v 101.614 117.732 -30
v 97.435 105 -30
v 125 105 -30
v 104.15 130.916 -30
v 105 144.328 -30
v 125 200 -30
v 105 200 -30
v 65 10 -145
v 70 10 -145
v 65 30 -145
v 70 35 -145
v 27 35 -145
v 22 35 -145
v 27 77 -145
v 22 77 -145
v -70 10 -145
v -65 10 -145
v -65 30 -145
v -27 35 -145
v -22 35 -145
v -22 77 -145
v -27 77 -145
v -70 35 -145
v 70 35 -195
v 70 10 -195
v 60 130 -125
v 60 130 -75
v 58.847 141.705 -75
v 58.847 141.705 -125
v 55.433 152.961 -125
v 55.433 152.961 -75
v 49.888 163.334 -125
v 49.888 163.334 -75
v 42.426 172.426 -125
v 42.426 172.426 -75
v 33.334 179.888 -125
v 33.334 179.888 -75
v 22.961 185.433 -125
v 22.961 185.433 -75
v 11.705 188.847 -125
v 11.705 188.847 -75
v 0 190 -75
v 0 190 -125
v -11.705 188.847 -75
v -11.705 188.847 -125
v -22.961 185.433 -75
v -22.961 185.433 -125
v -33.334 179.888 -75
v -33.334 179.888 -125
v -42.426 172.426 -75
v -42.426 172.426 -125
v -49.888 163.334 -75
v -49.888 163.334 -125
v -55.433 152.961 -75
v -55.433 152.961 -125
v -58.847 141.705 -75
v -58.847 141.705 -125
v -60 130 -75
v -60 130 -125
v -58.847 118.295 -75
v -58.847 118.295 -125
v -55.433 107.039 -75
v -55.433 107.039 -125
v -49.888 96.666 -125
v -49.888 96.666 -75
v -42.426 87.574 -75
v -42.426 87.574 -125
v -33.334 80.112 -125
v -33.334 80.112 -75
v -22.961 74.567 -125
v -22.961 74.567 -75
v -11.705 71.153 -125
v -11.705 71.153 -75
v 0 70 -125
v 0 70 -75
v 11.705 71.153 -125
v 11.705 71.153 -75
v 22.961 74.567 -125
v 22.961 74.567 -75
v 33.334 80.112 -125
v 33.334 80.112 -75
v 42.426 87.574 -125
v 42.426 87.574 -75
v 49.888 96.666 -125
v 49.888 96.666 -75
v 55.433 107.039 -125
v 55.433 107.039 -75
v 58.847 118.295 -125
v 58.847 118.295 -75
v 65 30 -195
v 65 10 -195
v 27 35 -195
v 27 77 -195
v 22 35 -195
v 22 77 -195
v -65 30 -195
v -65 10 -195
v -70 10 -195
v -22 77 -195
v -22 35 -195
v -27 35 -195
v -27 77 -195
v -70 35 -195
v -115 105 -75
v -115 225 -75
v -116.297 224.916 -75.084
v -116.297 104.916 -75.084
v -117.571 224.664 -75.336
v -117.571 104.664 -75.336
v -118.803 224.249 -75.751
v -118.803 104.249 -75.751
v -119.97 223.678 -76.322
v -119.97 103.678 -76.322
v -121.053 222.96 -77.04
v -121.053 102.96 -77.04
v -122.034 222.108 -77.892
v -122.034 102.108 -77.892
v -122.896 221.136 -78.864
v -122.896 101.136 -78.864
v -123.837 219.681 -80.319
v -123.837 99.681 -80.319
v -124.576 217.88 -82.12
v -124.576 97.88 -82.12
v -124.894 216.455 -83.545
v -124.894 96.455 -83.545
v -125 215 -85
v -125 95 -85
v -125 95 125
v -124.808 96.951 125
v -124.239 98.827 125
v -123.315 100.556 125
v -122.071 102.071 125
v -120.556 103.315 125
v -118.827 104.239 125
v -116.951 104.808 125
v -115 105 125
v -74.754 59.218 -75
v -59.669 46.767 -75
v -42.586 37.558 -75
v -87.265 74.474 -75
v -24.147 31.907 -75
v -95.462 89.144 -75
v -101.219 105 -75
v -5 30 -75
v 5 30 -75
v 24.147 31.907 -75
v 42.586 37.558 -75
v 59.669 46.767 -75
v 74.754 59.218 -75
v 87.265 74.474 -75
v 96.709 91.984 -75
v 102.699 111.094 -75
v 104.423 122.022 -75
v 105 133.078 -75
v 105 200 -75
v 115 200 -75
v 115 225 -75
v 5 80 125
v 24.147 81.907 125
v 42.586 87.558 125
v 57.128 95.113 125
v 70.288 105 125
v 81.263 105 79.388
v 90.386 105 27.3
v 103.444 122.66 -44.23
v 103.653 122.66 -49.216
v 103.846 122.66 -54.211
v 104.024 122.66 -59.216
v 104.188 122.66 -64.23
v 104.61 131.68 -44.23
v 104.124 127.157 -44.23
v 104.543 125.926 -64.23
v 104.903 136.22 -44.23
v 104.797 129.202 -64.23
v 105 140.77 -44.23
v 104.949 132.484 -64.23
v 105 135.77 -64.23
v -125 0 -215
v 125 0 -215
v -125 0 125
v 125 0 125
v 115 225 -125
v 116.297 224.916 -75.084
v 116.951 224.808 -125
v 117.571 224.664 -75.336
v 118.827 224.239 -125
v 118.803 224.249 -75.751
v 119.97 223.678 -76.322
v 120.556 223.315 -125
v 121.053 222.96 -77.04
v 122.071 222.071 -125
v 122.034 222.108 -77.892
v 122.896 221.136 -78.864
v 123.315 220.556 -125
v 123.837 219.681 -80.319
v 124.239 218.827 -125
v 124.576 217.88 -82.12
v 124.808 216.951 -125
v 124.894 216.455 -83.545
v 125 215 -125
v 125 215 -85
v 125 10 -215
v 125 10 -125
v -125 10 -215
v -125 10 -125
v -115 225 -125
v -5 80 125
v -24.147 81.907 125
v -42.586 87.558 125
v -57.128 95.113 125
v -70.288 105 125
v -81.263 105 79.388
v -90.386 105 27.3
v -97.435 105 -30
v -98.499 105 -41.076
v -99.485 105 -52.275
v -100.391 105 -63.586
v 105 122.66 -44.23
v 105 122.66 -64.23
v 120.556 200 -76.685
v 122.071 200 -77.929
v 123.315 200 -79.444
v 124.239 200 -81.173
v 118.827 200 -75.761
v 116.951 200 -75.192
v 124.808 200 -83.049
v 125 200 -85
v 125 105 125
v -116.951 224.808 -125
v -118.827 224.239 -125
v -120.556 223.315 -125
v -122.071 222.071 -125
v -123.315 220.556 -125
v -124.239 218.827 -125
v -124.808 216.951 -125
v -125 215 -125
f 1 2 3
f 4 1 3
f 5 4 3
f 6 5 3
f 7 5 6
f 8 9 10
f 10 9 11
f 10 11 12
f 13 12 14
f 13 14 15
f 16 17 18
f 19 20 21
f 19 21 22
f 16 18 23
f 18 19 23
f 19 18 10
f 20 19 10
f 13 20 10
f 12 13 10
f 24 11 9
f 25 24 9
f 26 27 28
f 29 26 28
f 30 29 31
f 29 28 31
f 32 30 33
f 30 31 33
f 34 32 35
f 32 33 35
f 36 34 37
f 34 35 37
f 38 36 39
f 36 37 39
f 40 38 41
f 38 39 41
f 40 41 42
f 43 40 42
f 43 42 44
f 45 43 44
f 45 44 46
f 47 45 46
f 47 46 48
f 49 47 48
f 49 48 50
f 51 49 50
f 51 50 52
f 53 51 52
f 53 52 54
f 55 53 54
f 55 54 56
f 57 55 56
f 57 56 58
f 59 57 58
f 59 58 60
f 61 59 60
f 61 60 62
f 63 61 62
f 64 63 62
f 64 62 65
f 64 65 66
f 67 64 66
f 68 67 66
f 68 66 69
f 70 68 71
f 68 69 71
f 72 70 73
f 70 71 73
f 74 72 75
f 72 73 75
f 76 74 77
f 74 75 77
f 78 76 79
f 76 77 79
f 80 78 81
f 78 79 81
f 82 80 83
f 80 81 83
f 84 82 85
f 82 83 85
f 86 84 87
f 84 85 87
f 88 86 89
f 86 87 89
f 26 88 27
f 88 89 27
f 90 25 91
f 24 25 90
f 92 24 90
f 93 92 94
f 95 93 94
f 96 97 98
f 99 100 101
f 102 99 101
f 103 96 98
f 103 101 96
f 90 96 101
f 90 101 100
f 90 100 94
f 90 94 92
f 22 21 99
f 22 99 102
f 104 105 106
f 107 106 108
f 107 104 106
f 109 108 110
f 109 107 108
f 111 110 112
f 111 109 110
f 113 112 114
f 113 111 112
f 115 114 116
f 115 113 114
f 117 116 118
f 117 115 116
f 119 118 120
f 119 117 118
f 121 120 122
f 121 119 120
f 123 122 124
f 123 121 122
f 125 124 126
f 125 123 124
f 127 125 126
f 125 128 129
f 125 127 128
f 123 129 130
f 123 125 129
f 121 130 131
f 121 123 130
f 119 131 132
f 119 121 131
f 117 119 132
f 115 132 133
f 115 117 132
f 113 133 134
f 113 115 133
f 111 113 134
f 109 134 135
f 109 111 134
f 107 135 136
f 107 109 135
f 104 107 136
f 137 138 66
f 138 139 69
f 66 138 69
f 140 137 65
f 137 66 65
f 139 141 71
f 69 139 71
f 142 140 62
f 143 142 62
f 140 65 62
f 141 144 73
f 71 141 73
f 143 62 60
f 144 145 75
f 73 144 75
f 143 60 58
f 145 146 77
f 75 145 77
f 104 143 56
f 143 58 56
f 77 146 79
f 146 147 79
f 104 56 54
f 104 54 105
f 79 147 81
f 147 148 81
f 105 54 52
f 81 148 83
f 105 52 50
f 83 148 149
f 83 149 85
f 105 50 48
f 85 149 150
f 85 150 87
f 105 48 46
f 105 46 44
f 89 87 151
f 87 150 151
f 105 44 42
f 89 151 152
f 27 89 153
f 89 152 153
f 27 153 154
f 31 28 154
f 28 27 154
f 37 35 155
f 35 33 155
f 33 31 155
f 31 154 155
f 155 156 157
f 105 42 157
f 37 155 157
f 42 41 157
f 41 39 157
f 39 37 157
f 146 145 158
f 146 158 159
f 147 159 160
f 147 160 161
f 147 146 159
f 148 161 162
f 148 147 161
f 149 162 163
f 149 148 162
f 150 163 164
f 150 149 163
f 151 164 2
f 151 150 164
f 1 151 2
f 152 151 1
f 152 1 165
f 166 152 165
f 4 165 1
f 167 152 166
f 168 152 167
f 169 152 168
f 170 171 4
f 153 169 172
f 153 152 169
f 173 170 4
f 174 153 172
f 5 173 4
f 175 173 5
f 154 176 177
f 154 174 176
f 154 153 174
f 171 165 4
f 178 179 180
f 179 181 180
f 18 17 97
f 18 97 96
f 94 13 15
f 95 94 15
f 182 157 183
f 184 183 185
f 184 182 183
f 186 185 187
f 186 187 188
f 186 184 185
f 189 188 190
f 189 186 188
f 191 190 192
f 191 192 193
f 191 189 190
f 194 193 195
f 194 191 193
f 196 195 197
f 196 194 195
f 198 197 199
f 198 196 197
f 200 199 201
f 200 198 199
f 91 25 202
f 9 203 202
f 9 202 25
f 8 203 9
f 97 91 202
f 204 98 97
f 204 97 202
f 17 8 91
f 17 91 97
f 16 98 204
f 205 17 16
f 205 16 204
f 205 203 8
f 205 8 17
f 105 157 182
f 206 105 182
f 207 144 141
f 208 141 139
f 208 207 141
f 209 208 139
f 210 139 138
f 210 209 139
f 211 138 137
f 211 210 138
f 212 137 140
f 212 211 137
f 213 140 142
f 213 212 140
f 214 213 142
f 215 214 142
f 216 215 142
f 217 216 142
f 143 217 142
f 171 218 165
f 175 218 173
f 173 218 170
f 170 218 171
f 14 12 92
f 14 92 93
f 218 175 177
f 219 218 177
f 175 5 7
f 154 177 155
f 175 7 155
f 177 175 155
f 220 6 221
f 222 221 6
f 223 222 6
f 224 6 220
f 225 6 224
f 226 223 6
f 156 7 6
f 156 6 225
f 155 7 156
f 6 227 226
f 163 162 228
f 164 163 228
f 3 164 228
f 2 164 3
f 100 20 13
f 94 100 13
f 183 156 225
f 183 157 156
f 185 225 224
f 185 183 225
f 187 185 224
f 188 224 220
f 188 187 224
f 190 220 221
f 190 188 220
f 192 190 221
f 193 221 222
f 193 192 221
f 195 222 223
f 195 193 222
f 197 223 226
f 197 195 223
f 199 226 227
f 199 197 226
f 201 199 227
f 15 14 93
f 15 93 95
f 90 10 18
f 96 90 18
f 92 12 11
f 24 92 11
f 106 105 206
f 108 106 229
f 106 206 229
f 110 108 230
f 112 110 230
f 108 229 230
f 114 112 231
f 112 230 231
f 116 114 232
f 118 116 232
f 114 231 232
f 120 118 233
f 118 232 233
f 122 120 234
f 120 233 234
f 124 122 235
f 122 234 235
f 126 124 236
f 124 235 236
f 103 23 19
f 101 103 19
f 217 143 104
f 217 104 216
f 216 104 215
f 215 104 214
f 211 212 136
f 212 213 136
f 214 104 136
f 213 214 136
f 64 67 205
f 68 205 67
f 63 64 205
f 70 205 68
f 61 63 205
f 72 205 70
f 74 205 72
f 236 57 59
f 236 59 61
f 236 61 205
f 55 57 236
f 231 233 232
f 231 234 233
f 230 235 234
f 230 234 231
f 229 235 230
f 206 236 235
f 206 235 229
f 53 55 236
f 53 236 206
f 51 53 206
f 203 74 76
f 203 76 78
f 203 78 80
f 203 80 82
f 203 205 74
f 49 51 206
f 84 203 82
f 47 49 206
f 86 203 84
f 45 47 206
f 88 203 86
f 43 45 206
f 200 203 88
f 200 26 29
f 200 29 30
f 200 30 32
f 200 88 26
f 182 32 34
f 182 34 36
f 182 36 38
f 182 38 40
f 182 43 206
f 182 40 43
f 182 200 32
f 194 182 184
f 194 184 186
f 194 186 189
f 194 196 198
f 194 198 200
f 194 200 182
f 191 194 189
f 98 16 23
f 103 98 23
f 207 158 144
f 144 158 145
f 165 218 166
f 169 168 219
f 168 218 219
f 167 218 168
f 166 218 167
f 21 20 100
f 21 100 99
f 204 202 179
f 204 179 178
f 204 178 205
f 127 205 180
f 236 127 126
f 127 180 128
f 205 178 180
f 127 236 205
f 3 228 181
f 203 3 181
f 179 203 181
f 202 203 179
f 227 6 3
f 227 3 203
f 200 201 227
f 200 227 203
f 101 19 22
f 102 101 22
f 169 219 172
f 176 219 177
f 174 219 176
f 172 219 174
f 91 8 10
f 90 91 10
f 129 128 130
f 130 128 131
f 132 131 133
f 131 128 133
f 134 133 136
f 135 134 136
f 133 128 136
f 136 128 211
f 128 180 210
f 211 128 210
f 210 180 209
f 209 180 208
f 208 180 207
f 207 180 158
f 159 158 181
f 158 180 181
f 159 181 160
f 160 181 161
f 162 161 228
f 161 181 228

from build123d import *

# Parameters (mm, degrees)
SKETCH2_W                = 250
SKETCH2_H                = 250
BOSS_EXTRUDE1_DEPTH      = 250
SKETCH3_W                = 210
SKETCH3_H                = 200
CUT_EXTRUDE1_DEPTH       = 220
BOSS_EXTRUDE2_REACH      = 363.974
FILLET1_R                = 100
FILLET2_R                = 20
SKETCH11_R               = 60
CUT_EXTRUDE2_DEPTH       = 344.693177122
SKETCH12_W               = 250
SKETCH12_H               = 10
BOSS_EXTRUDE3_DEPTH      = 90
BOSS_EXTRUDE4_START      = 20
SKETCH13_W               = 5
SKETCH13_H               = 20
BOSS_EXTRUDE4_DEPTH      = 50
BOSS_EXTRUDE5_START      = 20
SKETCH14_W               = 5
SKETCH14_H               = 42
BOSS_EXTRUDE5_DEPTH      = 50
SKETCH15_W               = 20
SKETCH15_H               = 40
CUT_EXTRUDE3_DEPTH       = 20
SKETCH17_W               = 20
SKETCH17_H               = 40
CUT_EXTRUDE5_DEPTH       = 23
SKETCH18_W               = 20
SKETCH18_H               = 10
BOSS_EXTRUDE6_DEPTH      = 20
SKETCH19_W               = 250
SKETCH19_H               = 50
CUT_EXTRUDE11_DEPTH      = 70
SKETCH24_W               = 200
SKETCH24_H               = 95
CUT_EXTRUDE12_DEPTH      = 70
CUT_EXTRUDE14_DEPTH      = 414.793426724
SKETCH26_W               = 75
SKETCH26_H               = 50
CUT_EXTRUDE15_DEPTH      = 344.693177122
BOSS_EXTRUDE7_REACH      = 415.793
SKETCH27_W               = 50
SKETCH27_H               = 25
CUT_EXTRUDE16_DEPTH      = 374.296129099
CUT_EXTRUDE16_DEPTH_BACK = 374.296129099
SKETCH28_W               = 50
SKETCH28_H               = 25
FILLET3_R                = 10
SKETCH29_W               = 20
SKETCH29_H               = 39.615
BOSS_EXTRUDE8_DEPTH      = 95


with BuildPart() as part:
    # Sketch2 → Boss-Extrude1 (new body)
    with BuildSketch(Plane(origin=(0, 0, 0), x_dir=(1, 0, 0), z_dir=(0, 1, 0))):
        Rectangle(SKETCH2_W, SKETCH2_H)
    extrude(amount=BOSS_EXTRUDE1_DEPTH)

    # Sketch3 → Cut-Extrude1 (cut)
    with BuildSketch(Plane(origin=(0, 250, 0), x_dir=(1, 0, 0), z_dir=(0, 1, 0))):
        with Locations((0, -25)):
            Rectangle(SKETCH3_W, SKETCH3_H)
    extrude(amount=-CUT_EXTRUDE1_DEPTH, mode=Mode.SUBTRACT)

    # Sketch5 → Boss-Extrude2 (add, up to next)
    with BuildSketch(Plane.ZY.offset(-105), mode=Mode.PRIVATE) as boss_extrude2_sk1:
        Polygon((125, 30), (125, 80), (-75, 30), align=None)
    boss_extrude2_tool1 = extrude(boss_extrude2_sk1.sketch, amount=BOSS_EXTRUDE2_REACH, mode=Mode.PRIVATE) - part.part
    add(boss_extrude2_tool1.solids().sort_by_distance((105, 46.666667, 58.333333))[0])

    # Fillet1
    fillet1_edges = [part.edges().sort_by_distance(p)[0] for p in [
        (-105, 55, 25),
        (105, 55, 25),
    ]]
    fillet(fillet1_edges, radius=FILLET1_R)

    # Fillet2
    fillet2_edges = [part.edges().sort_by_distance(p)[0] for p in [
        (115, 250, 125),
        (-115, 250, 125),
        (105, 250, 25),
        (0, 250, -75),
        (-105, 250, 25),
    ]]
    fillet(fillet2_edges, radius=FILLET2_R - 0.0001)  # a hair under: the kernel refuses the full size

    # Sketch11 → Cut-Extrude2 (cut, through all)
    with BuildSketch(Plane.XY.offset(-75)):
        with Locations((0, 130)):
            Circle(SKETCH11_R)
    extrude(amount=-CUT_EXTRUDE2_DEPTH, mode=Mode.SUBTRACT)

    # Sketch12 → Boss-Extrude3 (add)
    with BuildSketch(Plane(origin=(0, 0, -125), x_dir=(-1, 0, 0), z_dir=(0, 0, -1))):
        with Locations((0, 5)):
            Rectangle(SKETCH12_W, SKETCH12_H)
    extrude(amount=BOSS_EXTRUDE3_DEPTH)

    # Sketch13 → Boss-Extrude4 (add)
    with BuildSketch(Plane(origin=(0, 0, -125), x_dir=(-1, 0, 0), z_dir=(0, 0, -1)).offset(BOSS_EXTRUDE4_START)):
        Polygon((-70, 35), (-70, 30), (-65, 30), (0, 30), (0, 35), align=None)
        Polygon((0, 35), (0, 30), (65, 30), (70, 30), (70, 35), align=None)
        with Locations((67.5, 20)):
            Rectangle(SKETCH13_W, SKETCH13_H)
        with Locations((-67.5, 20)):
            Rectangle(SKETCH13_W, SKETCH13_H)
    extrude(amount=BOSS_EXTRUDE4_DEPTH)

    # Sketch14 → Boss-Extrude5 (add)
    with BuildSketch(Plane(origin=(0, 0, -125), x_dir=(-1, 0, 0), z_dir=(0, 0, -1)).offset(BOSS_EXTRUDE5_START)):
        with Locations((24.5, 56)):
            Rectangle(SKETCH14_W, SKETCH14_H)
        with Locations((-24.5, 56)):
            Rectangle(SKETCH14_W, SKETCH14_H)
    extrude(amount=BOSS_EXTRUDE5_DEPTH)

    # Sketch15 → Cut-Extrude3 (cut)
    with BuildSketch(Plane(origin=(125, 0, 0), x_dir=(0, 0, -1), z_dir=(1, 0, 0))):
        with Locations((54.23, 147.66)):
            Rectangle(SKETCH15_W, SKETCH15_H)
    extrude(amount=-CUT_EXTRUDE3_DEPTH, mode=Mode.SUBTRACT)

    # Sketch17 → Cut-Extrude5 (cut)
    with BuildSketch(Plane(origin=(125, 0, 0), x_dir=(0, 0, -1), z_dir=(1, 0, 0))):
        with Locations((54.23, 142.66)):
            Rectangle(SKETCH17_W, SKETCH17_H)
    extrude(amount=-CUT_EXTRUDE5_DEPTH, mode=Mode.SUBTRACT)

    # Sketch18 → Boss-Extrude6 (add)
    with BuildSketch(Plane(origin=(125, 0, 0), x_dir=(0, 0, -1), z_dir=(1, 0, 0))):
        with Locations((54.23, 162.66)):
            Rectangle(SKETCH18_W, SKETCH18_H)
    extrude(amount=-BOSS_EXTRUDE6_DEPTH)

    # Sketch19 → Cut-Extrude11 (cut)
    with BuildSketch(Plane.ZY.offset(125)):
        with Locations((0, 225)):
            Rectangle(SKETCH19_W, SKETCH19_H)
    extrude(amount=-CUT_EXTRUDE11_DEPTH, mode=Mode.SUBTRACT)

    # Sketch24 → Cut-Extrude12 (cut)
    with BuildSketch(Plane.ZY.offset(125)):
        with Locations((25, 152.5)):
            Rectangle(SKETCH24_W, SKETCH24_H)
    extrude(amount=-CUT_EXTRUDE12_DEPTH, mode=Mode.SUBTRACT)

    # Sketch25 → Cut-Extrude14 (cut, through all)
    with BuildSketch(Plane.ZY.offset(125)):
        Polygon((125, 105), (-30, 105), (-30, 200), (-75, 200), (-75, 250), (125, 250), align=None)
    extrude(amount=-CUT_EXTRUDE14_DEPTH, mode=Mode.SUBTRACT)

    # Sketch26 → Cut-Extrude15 (cut, through all)
    with BuildSketch(Plane.XY.offset(-75)):
        with Locations((87.5, 225)):
            Rectangle(SKETCH26_W, SKETCH26_H)
    extrude(amount=-CUT_EXTRUDE15_DEPTH, mode=Mode.SUBTRACT)

    # Boss-Extrude7: up to this face of the body (flat: up to its plane)
    boss_extrude7_end = Plane(part.part.faces().sort_by_distance((-125, 66.05015674, -19.686520376))[0])
    # Sketch27 → Boss-Extrude7 (add, up to the picked face)
    with BuildSketch(Plane(origin=(125, 0, 0), x_dir=(0, 0, -1), z_dir=(1, 0, 0)), mode=Mode.PRIVATE) as boss_extrude7_sk1:
        with Locations((100, 212.5)):
            Rectangle(SKETCH27_W, SKETCH27_H)
    boss_extrude7_tool1 = split(extrude(boss_extrude7_sk1.sketch, amount=-BOSS_EXTRUDE7_REACH, mode=Mode.PRIVATE), bisect_by=boss_extrude7_end, keep=Keep.BOTH, mode=Mode.PRIVATE)
    add(boss_extrude7_tool1.solids().sort_by(Axis((125, 212.5, -100), (-1, 0, 0)))[0])

    # Sketch28 → Cut-Extrude16 (cut, two sides: drawn at the far end of the back side and taken through both)
    with BuildSketch(Plane(origin=(50, 0, 0), x_dir=(0, 0, -1), z_dir=(1, 0, 0)).offset(-CUT_EXTRUDE16_DEPTH_BACK)):
        with Locations((100, 237.5)):
            Rectangle(SKETCH28_W, SKETCH28_H)
    extrude(amount=CUT_EXTRUDE16_DEPTH + CUT_EXTRUDE16_DEPTH_BACK, mode=Mode.SUBTRACT)

    # Fillet3
    fillet3_edges = [part.edges().sort_by_distance(p)[0] for p in [
        (-125, 165, -75),
        (-125, 105, 25),
        (125, 225, -100),
        (125, 212.5, -75),
        (-125, 225, -100),
    ]]
    fillet(fillet3_edges, radius=FILLET3_R)

    # Sketch29 → Boss-Extrude8 (add)
    with BuildSketch(Plane(origin=(0, 200, 0), x_dir=(1, 0, 0), z_dir=(0, 1, 0))):
        with Locations((115, 49.8075)):
            Rectangle(SKETCH29_W, SKETCH29_H)
    extrude(amount=-BOSS_EXTRUDE8_DEPTH)


solid = part.part
